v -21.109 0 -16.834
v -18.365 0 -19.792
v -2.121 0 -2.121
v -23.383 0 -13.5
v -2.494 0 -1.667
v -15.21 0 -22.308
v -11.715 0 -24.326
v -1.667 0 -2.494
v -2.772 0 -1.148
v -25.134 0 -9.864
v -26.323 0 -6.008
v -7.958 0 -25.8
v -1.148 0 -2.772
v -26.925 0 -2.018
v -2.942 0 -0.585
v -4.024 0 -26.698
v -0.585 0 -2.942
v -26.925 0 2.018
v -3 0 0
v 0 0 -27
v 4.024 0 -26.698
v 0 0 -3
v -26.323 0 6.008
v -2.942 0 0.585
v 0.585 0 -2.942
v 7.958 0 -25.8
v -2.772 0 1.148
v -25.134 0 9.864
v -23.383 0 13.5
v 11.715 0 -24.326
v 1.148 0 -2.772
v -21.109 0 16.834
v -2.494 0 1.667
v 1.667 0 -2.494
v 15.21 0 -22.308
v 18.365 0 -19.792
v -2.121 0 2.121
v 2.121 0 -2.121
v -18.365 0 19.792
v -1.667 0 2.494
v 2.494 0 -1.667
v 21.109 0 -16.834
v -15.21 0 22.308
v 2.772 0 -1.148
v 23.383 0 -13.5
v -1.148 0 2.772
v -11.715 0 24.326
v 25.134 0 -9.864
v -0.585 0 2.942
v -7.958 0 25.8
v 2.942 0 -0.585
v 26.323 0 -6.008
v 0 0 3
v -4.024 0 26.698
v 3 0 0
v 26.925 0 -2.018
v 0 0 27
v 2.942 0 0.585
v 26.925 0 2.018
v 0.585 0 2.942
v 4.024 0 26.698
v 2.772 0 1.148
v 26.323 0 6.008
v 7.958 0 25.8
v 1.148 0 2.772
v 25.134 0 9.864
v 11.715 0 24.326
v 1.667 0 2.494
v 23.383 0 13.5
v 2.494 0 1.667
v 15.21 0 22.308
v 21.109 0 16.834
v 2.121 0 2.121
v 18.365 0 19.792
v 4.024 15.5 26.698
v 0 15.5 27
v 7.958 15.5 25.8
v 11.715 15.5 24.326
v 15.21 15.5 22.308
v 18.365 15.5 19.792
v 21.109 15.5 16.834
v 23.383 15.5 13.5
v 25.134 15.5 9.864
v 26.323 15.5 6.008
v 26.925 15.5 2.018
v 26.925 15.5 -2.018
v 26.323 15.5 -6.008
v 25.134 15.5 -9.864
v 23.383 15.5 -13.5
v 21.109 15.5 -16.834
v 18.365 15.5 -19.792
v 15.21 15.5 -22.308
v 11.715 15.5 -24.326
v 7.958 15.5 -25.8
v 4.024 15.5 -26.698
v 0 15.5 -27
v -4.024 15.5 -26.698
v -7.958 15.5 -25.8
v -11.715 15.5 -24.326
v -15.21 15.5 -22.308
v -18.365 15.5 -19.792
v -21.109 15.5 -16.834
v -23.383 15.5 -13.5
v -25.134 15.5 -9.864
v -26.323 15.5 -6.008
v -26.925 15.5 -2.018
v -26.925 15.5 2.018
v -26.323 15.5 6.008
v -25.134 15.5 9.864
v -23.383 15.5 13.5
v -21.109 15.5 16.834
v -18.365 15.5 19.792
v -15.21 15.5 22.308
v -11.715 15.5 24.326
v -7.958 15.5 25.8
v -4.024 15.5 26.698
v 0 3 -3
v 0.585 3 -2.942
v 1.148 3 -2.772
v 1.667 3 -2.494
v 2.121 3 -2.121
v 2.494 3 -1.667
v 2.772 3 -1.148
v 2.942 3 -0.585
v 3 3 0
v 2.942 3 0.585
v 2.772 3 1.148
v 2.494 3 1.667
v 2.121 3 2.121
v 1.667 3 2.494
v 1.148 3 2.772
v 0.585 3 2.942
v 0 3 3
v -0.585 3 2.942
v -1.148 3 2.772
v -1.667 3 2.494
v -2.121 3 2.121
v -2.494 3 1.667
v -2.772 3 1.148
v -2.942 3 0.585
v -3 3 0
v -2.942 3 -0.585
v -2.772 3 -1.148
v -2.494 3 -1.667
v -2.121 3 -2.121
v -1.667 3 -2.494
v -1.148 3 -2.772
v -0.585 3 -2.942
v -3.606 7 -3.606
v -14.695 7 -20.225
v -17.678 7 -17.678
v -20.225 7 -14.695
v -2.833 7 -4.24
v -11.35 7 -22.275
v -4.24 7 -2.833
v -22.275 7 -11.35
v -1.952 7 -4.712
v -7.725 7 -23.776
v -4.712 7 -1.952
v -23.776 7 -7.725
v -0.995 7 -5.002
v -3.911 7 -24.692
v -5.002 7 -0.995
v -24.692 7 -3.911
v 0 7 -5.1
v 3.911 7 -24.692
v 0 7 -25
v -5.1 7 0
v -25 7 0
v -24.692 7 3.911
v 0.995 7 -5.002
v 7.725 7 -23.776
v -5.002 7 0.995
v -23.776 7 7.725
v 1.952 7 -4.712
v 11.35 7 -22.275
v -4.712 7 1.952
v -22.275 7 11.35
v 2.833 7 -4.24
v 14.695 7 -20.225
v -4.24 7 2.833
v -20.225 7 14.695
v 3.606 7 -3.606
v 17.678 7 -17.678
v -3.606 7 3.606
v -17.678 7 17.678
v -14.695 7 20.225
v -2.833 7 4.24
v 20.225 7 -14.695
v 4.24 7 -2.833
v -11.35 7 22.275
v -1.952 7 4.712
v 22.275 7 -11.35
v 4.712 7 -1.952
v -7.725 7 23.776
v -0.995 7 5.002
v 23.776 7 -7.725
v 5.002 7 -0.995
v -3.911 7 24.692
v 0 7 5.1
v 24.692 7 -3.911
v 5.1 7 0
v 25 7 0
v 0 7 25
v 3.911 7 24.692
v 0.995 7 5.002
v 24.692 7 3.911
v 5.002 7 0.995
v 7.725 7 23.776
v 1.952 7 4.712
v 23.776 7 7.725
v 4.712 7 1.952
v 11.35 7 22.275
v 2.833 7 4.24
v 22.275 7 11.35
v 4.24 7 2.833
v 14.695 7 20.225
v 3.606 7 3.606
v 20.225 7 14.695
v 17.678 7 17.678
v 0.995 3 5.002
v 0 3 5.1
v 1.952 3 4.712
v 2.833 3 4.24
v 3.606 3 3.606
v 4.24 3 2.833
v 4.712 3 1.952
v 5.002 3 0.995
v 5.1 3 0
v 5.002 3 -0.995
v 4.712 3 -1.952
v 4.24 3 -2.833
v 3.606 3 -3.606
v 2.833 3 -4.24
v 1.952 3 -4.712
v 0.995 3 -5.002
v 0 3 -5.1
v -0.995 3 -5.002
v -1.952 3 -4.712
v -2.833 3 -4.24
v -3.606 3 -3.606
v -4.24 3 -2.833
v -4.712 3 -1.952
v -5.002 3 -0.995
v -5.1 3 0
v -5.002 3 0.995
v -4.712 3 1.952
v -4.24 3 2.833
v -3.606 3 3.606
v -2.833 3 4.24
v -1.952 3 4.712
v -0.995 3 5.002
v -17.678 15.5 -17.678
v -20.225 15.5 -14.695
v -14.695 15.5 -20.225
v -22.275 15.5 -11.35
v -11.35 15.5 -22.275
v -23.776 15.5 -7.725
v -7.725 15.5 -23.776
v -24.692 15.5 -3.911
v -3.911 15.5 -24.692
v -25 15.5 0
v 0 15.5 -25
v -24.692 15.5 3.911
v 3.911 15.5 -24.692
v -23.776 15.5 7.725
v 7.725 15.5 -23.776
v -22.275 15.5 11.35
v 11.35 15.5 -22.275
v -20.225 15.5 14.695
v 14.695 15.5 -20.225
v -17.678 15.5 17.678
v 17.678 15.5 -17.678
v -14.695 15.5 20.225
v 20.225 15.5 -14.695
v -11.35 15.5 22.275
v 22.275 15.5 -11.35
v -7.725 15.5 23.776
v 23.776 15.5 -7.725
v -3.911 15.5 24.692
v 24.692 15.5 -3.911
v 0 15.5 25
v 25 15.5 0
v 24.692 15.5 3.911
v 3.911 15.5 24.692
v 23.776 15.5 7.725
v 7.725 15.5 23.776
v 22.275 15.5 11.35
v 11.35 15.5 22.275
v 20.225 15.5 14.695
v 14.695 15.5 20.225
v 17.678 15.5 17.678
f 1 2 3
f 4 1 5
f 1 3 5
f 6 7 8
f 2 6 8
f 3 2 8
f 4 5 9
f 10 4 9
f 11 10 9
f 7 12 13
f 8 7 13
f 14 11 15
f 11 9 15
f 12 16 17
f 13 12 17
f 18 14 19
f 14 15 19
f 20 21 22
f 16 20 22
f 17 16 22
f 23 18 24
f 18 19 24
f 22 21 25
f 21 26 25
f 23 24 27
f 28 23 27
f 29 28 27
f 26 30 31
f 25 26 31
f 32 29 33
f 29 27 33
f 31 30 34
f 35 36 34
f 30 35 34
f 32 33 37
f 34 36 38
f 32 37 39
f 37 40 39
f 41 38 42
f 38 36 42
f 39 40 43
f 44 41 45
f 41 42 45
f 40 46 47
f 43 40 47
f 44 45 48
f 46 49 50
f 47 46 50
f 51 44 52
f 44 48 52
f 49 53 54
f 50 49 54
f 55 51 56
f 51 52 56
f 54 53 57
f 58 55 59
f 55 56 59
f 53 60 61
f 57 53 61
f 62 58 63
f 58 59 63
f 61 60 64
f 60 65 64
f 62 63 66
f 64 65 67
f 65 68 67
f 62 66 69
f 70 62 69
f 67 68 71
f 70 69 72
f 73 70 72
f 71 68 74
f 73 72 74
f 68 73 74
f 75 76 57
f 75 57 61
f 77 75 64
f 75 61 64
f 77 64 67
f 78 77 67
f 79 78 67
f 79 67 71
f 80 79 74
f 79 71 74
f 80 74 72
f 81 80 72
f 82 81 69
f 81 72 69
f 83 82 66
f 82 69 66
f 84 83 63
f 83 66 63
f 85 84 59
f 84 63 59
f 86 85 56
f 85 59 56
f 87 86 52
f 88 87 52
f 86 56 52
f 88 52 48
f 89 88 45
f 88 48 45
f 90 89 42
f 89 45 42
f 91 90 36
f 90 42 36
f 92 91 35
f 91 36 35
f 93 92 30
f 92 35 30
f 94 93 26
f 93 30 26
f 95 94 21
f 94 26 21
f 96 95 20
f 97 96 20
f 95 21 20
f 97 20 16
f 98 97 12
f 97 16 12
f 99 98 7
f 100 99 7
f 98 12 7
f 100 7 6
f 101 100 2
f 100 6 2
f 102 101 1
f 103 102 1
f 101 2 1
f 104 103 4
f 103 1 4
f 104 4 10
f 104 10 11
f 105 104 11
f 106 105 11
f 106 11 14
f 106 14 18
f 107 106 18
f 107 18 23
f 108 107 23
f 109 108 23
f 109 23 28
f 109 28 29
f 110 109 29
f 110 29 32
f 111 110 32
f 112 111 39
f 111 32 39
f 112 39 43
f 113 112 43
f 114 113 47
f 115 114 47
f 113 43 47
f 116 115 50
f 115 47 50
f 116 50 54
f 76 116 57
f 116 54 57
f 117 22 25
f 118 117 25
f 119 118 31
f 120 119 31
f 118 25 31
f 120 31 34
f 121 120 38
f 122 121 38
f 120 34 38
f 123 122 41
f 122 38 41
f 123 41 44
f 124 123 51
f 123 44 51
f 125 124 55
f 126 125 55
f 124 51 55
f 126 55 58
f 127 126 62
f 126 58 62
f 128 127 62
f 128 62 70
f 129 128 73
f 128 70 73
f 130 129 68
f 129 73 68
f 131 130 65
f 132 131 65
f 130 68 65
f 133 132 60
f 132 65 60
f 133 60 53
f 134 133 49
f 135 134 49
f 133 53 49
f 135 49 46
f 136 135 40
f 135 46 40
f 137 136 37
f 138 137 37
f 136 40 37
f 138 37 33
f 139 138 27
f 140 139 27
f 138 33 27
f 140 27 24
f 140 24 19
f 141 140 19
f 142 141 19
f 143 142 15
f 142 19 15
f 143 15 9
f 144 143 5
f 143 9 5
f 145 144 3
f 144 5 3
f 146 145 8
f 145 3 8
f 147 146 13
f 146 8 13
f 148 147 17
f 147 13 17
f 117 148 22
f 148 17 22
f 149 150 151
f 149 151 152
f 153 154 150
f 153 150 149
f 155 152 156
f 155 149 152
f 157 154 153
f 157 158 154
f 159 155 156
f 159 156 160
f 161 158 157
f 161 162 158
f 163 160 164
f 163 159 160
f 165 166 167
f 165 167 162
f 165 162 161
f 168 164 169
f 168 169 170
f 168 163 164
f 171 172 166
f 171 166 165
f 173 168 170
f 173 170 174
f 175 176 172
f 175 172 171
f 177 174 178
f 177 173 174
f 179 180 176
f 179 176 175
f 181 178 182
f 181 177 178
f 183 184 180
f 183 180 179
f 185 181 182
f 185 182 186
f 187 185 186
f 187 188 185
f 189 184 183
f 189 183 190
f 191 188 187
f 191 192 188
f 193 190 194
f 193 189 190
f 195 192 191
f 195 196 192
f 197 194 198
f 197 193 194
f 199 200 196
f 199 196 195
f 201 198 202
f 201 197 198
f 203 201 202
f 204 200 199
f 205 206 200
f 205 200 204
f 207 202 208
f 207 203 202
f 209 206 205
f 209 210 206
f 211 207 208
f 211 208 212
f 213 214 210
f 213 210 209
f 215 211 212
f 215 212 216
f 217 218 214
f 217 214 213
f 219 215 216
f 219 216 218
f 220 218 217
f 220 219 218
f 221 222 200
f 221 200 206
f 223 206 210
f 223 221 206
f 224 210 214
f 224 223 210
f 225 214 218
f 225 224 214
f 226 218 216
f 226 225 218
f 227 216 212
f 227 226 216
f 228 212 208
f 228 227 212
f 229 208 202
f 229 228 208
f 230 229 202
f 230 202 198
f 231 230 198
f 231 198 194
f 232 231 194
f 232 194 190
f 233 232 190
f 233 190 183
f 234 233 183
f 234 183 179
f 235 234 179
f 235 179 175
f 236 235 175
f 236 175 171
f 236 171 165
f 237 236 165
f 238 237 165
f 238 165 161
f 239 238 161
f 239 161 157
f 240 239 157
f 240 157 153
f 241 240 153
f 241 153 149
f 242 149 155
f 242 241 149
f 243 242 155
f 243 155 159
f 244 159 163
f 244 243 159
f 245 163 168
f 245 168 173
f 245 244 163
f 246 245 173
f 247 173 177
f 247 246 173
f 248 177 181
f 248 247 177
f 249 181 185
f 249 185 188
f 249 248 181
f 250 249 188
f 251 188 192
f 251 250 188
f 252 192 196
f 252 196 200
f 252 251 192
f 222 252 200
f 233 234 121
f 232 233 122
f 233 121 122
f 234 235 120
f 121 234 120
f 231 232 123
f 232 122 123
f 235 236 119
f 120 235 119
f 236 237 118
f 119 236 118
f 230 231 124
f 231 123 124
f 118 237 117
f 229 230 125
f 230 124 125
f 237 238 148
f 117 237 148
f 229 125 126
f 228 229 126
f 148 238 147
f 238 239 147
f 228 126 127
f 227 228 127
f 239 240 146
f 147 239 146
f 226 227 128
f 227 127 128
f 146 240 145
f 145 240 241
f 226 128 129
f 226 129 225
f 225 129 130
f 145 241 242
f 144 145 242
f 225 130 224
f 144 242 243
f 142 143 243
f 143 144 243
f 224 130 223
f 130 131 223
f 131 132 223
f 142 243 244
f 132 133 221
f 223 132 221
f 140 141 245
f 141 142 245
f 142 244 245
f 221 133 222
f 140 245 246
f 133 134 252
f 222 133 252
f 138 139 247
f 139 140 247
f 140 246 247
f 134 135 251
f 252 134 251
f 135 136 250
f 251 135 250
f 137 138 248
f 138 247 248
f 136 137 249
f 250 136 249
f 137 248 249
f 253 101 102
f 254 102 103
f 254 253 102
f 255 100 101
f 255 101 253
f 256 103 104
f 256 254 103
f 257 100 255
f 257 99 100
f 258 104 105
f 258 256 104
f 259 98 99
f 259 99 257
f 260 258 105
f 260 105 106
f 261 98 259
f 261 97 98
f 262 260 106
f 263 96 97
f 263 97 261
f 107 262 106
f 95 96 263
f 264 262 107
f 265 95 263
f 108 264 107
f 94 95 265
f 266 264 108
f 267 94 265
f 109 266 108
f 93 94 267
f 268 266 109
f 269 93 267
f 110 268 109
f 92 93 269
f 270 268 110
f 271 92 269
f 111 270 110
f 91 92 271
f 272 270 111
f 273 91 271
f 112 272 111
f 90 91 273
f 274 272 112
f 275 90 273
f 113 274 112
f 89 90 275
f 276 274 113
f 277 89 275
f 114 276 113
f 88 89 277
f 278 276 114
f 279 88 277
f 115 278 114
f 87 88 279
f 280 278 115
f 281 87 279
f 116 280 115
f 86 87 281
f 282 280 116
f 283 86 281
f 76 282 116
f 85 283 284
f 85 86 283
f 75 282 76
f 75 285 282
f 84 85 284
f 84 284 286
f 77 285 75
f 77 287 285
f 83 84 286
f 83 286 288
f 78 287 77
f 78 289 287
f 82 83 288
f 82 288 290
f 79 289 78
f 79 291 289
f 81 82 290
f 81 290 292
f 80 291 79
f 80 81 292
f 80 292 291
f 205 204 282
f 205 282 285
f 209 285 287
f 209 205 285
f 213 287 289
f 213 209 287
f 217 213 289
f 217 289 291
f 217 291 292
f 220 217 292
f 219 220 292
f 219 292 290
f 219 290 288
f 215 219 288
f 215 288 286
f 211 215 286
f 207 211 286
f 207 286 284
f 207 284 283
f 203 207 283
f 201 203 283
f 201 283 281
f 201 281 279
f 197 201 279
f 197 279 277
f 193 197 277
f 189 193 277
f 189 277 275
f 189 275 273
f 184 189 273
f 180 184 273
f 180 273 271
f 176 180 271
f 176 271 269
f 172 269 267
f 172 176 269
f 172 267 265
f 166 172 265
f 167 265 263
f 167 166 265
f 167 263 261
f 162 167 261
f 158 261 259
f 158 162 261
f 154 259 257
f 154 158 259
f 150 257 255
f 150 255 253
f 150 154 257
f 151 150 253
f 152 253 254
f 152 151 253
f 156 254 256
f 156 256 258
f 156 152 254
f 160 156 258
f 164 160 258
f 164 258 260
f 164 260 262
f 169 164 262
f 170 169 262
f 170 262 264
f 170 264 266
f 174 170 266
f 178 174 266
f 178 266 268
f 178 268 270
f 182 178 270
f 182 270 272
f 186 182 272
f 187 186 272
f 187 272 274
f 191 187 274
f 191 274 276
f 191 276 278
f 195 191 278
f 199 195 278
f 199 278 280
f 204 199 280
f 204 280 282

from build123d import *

# Parameters (mm, degrees)
ESQUISSE1_R             = 25
ESQUISSE1_R_2           = 5.1
BOSS_EXTRU_1_DEPTH      = 7
ESQUISSE2_R             = 25
ESQUISSE2_R_2           = 3
BOSS_EXTRU_2_DEPTH      = 3
BOSS_EXTRU_3_DEPTH      = 8.5
BOSS_EXTRU_3_DEPTH_BACK = 7
ESQUISSE3_R             = 27
ESQUISSE3_R_2           = 25


with BuildPart() as part:
    # Esquisse1 → Boss.-Extru.1 (new body)
    with BuildSketch(Plane(origin=(0, 0, 0), x_dir=(1, 0, 0), z_dir=(0, 1, 0))):
        with Locations(Location((0, 0, 0), (0, 0, 270))):
            Circle(ESQUISSE1_R)
        with Locations(Location((0, 0, 0), (0, 0, 270))):
            Circle(ESQUISSE1_R_2, mode=Mode.SUBTRACT)
    extrude(amount=BOSS_EXTRU_1_DEPTH)

    # Esquisse2 → Boss.-Extru.2 (add)
    with BuildSketch(Plane.XZ):
        with Locations(Location((0, 0, 0), (0, 0, 90))):
            Circle(ESQUISSE2_R)
        with Locations(Location((0, 0, 0), (0, 0, 270))):
            Circle(ESQUISSE2_R_2, mode=Mode.SUBTRACT)
    extrude(amount=-BOSS_EXTRU_2_DEPTH)

    # Esquisse3 → Boss.-Extru.3 (add, two sides: drawn at the far end of the back side and taken through both)
    with BuildSketch(Plane(origin=(0, 7, 0), x_dir=(1, 0, 0), z_dir=(0, 1, 0)).offset(-BOSS_EXTRU_3_DEPTH_BACK)):
        with Locations(Location((0, 0, 0), (0, 0, 270))):
            Circle(ESQUISSE3_R)
        with Locations(Location((0, 0, 0), (0, 0, 270))):
            Circle(ESQUISSE3_R_2, mode=Mode.SUBTRACT)
    extrude(amount=BOSS_EXTRU_3_DEPTH + BOSS_EXTRU_3_DEPTH_BACK)


solid = part.part
